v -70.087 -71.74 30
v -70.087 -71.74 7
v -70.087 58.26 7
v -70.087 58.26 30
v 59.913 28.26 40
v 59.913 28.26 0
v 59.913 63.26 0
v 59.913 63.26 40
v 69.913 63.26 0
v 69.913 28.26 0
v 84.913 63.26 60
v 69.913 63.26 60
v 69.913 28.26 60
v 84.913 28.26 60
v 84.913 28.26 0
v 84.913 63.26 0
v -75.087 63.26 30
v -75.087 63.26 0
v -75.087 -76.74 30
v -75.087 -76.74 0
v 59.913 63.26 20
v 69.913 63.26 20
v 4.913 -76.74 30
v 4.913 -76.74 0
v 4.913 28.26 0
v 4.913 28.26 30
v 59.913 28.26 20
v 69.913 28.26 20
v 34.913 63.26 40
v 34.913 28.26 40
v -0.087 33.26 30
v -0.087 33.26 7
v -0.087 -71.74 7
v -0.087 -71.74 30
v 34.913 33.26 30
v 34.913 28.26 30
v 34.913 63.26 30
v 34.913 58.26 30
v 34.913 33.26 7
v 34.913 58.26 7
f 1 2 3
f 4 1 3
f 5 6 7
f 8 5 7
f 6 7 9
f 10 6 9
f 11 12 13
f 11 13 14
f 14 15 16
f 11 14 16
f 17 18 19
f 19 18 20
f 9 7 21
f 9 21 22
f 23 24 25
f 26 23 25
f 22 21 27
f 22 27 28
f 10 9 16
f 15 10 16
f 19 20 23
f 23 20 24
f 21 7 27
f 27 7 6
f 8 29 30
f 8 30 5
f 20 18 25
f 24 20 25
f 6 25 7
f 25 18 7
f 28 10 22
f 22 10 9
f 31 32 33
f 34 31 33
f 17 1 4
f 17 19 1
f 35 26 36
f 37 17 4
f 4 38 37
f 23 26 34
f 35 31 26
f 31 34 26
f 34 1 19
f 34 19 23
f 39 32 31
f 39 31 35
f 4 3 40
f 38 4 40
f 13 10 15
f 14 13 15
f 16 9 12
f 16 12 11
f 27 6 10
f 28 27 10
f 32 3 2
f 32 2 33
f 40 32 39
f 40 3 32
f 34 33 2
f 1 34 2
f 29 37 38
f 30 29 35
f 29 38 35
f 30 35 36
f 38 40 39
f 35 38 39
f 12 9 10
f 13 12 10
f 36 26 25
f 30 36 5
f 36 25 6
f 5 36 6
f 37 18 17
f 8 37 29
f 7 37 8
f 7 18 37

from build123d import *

# Parameters (mm, degrees)
F0_W     = 5
F0_H     = 5
F0_H_2   = 30
F0_W_2   = 70
F1_DEPTH = 30
F0_H_3   = 100
F0_H_4   = 25
F0_W_3   = 30
F2_DEPTH = 7
F3_DEPTH = 30
F0_W_4   = 25
F4_DEPTH = 40
F0_W_5   = 15
F5_DEPTH = 60
F0_W_6   = 10
F6_DEPTH = 20


with BuildPart() as f1:
    # F0 (on Top) → F1 (new body)
    with BuildSketch(Plane.XY):
        with Locations((-72.5873509794, 60.7595711946)):
            Rectangle(F0_W, F0_H)
        with Locations((-72.5873509794, 43.2595711946)):
            Rectangle(F0_W, F0_H_2)
        Polygon((-70.0873509794, 28.2595711946), (-75.0873509794, 28.2595711946), (-75.0873509794, -76.7404288054), (4.9126490206, -76.7404288054), (4.9126490206, 28.2595711946), (-0.0873509794, 28.2595711946), (-0.0873509794, -71.7404288054), (-70.0873509794, -71.7404288054), align=None)
        with Locations((-35.0873509794, 60.7595711946)):
            Rectangle(F0_W_2, F0_H)
        with Locations((2.4126490206, 30.7595711946)):
            Rectangle(F0_W, F0_H)
        with Locations((2.4126490206, 60.7595711946)):
            Rectangle(F0_W, F0_H)
    extrude(amount=F1_DEPTH)

    # F0 (on Top) → F2 (join)
    with BuildSketch(Plane.XY):
        Polygon((-0.0873509794, 58.2595711946), (-70.0873509794, 58.2595711946), (-70.0873509794, 28.2595711946), (-0.0873509794, 28.2595711946), (-0.0873509794, 33.2595711946), align=None)
        with Locations((-35.0873509794, -21.7404288054)):
            Rectangle(F0_W_2, F0_H_3)
        with Locations((2.4126490206, 45.7595711946)):
            Rectangle(F0_W, F0_H_4)
        with Locations((19.9126490206, 45.7595711946)):
            Rectangle(F0_W_3, F0_H_4)
    extrude(amount=F2_DEPTH)

    # F0 (on Top) → F3 (join)
    with BuildSketch(Plane.XY):
        with Locations((19.9126490206, 60.7595711946)):
            Rectangle(F0_W_3, F0_H)
        with Locations((19.9126490206, 30.7595711946)):
            Rectangle(F0_W_3, F0_H)
    extrude(amount=F3_DEPTH)

    # F0 (on Top) → F4 (join)
    with BuildSketch(Plane.XY):
        with Locations((47.4126490206, 60.7595711946)):
            Rectangle(F0_W_4, F0_H)
        with Locations((47.4126490206, 45.7595711946)):
            Rectangle(F0_W_4, F0_H_4)
        with Locations((47.4126490206, 30.7595711946)):
            Rectangle(F0_W_4, F0_H)
    extrude(amount=F4_DEPTH)


with BuildPart() as f5:
    # F0 (on Top) → F5 (new body)
    with BuildSketch(Plane.XY):
        with Locations((77.4126490206, 60.7595711946)):
            Rectangle(F0_W_5, F0_H)
        with Locations((77.4126490206, 45.7595711946)):
            Rectangle(F0_W_5, F0_H_4)
        with Locations((77.4126490206, 30.7595711946)):
            Rectangle(F0_W_5, F0_H)
    extrude(amount=F5_DEPTH)


with BuildPart() as f6:
    # F0 (on Top) → F6 (new body)
    with BuildSketch(Plane.XY):
        with Locations((64.9126490206, 60.7595711946)):
            Rectangle(F0_W_6, F0_H)
        with Locations((64.9126490206, 45.7595711946)):
            Rectangle(F0_W_6, F0_H_4)
        with Locations((64.9126490206, 30.7595711946)):
            Rectangle(F0_W_6, F0_H)
    extrude(amount=F6_DEPTH)


solid = Compound([f1.part, f5.part, f6.part])
